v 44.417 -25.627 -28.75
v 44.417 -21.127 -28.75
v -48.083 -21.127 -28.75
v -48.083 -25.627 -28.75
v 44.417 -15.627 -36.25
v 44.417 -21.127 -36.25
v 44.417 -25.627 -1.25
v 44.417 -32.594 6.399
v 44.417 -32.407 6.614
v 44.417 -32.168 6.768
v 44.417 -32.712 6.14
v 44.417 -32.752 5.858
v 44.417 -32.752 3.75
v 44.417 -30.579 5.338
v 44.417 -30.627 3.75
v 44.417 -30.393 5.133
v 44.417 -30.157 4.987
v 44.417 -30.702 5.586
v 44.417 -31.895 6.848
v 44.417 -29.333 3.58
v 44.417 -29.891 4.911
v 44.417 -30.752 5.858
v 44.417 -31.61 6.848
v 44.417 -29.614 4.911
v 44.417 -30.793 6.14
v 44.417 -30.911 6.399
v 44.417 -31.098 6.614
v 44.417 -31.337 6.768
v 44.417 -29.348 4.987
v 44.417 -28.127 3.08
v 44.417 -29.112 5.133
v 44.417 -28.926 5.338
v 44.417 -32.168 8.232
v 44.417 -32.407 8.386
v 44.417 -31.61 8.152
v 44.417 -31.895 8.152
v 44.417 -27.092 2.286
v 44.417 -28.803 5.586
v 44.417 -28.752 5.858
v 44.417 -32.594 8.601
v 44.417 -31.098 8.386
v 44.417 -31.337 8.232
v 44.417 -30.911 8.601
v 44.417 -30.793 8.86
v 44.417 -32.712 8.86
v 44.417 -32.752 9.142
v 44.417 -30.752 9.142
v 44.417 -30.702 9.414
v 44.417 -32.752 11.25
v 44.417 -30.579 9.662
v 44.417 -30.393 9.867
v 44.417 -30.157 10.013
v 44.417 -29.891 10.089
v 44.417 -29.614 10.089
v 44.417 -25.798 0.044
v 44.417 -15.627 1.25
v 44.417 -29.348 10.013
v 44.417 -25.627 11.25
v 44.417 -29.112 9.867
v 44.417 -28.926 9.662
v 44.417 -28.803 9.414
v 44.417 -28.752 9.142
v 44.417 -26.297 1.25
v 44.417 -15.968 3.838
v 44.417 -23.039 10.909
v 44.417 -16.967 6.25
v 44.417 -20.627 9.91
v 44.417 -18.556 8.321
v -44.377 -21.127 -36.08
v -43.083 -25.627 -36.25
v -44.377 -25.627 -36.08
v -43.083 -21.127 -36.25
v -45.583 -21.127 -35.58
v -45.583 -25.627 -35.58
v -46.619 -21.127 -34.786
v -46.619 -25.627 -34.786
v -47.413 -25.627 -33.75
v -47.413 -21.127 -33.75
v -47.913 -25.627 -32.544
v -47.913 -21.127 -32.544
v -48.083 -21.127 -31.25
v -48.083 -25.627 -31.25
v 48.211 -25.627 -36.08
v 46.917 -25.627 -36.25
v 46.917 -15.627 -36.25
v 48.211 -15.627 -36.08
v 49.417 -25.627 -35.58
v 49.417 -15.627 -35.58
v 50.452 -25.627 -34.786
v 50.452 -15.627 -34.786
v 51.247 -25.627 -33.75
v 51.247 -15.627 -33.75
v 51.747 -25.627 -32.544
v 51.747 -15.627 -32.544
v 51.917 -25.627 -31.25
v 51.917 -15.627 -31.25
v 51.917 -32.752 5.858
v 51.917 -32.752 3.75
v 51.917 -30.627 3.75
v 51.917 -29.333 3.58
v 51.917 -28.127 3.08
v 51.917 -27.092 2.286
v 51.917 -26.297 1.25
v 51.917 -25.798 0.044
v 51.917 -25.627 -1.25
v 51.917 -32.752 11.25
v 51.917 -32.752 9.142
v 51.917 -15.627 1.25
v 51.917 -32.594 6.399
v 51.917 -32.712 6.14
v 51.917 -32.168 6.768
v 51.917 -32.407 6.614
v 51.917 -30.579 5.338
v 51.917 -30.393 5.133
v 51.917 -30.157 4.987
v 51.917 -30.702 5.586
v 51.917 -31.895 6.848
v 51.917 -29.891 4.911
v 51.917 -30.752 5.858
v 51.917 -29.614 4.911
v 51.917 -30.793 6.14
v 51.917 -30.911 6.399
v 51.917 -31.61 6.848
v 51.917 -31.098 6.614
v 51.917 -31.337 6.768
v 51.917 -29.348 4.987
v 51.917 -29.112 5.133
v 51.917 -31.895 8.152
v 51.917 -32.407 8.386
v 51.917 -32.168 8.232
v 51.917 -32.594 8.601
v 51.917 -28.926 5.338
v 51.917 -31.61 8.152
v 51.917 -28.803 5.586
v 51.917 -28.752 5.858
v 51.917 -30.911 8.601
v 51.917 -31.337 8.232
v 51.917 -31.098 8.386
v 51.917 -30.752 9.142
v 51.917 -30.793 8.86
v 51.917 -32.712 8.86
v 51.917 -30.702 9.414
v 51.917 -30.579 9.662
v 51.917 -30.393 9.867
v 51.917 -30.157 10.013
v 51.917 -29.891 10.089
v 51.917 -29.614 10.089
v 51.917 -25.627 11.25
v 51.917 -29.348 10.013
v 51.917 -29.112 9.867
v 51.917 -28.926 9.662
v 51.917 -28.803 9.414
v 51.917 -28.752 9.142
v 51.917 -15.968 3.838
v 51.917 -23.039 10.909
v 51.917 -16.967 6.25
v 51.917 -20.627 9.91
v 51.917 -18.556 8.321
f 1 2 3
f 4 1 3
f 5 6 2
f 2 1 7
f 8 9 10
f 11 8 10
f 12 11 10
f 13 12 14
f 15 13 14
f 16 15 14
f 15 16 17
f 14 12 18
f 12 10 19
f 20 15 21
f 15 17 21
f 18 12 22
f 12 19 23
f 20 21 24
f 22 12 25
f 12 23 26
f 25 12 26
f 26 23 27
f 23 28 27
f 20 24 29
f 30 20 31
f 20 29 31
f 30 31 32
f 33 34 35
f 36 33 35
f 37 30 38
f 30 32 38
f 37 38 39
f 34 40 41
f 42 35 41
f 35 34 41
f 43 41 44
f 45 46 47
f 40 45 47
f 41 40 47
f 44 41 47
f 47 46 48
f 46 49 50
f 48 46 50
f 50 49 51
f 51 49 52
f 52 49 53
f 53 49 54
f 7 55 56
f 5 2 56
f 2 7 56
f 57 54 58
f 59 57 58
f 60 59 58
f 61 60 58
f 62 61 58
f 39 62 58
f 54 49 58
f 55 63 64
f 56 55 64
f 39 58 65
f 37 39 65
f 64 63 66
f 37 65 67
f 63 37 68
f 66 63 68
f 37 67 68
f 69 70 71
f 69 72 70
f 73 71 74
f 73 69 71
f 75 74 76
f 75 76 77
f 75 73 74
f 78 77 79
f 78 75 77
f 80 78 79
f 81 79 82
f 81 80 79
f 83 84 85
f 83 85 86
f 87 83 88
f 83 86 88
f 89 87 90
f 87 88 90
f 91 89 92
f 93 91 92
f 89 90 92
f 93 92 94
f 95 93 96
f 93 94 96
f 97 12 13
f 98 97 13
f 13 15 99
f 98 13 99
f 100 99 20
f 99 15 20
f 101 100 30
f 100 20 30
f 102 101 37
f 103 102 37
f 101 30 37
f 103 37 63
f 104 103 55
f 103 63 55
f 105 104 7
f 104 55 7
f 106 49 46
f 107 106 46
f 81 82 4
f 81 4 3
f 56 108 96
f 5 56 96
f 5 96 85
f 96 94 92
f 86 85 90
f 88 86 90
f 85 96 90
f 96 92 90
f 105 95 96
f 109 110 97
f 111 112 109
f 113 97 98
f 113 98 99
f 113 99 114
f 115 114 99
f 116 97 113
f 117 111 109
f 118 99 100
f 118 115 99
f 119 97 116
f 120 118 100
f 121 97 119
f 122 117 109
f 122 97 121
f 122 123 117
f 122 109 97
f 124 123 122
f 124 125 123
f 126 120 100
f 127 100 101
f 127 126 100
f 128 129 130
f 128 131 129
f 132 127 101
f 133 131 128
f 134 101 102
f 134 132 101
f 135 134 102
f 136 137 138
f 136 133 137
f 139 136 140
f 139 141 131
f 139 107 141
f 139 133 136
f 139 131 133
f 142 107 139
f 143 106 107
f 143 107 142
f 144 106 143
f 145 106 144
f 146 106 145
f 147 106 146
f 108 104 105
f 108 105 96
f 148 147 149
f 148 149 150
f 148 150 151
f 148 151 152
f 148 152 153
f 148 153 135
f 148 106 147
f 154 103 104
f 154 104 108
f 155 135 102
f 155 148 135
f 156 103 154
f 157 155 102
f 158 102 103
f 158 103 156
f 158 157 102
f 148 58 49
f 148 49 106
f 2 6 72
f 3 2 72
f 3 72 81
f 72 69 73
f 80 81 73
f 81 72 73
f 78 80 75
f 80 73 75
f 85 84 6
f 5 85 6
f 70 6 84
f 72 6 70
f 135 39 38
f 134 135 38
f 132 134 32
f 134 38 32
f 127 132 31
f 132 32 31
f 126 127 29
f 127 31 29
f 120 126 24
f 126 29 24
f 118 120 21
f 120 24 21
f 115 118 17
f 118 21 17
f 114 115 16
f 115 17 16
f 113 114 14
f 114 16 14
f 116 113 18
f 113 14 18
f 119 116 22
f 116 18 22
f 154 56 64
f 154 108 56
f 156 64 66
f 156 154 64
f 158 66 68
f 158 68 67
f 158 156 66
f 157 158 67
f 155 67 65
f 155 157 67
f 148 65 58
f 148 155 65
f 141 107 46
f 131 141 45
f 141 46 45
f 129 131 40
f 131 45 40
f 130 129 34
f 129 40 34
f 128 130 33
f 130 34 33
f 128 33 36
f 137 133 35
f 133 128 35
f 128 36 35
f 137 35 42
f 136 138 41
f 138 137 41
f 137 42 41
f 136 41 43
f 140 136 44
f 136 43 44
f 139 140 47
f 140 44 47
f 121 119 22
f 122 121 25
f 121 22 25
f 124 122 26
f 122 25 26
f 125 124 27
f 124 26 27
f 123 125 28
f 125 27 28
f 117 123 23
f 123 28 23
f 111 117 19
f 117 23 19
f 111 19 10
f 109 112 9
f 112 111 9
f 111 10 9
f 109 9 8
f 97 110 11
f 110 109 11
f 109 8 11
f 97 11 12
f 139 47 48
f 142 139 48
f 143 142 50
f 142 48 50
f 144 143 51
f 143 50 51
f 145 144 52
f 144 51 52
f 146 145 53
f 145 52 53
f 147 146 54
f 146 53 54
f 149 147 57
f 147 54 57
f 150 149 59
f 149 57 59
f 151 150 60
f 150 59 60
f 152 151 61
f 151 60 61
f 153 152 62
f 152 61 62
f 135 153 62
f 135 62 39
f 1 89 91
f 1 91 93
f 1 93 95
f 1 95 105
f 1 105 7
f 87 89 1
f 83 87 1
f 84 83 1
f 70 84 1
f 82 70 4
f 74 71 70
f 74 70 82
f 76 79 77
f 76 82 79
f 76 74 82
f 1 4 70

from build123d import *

# Parameters (mm, degrees)
PUSHER_BASE_DEPTH   = 15
SKETCH3_R           = 1.95
SCREW_HOLE_DEPTH    = 7.5
SKETCH6_W           = 7.5
SKETCH6_H           = 30.25
PUSHER_HEAD_DEPTH   = 3.75
FILLET1_R           = 2
SKETCH9_W           = 40
SKETCH9_H           = 10
BOSS_EXTRUDE1_DEPTH = 7.5
SKETCH10_W          = 92.5
SKETCH10_H          = 4.5
BOSS_EXTRUDE2_DEPTH = 7.5
FILLET7_R           = 10
FILLET8_R           = 5
FILLET9_START       = 44.416899441
FILLET9_DEPTH       = 7.5
CUT_EXTRUDE1_DEPTH  = 10
SKETCH13_W          = 31.257668492
SKETCH13_H          = 16.460534108
CUT_EXTRUDE2_DEPTH  = 40


with BuildPart() as part:
    # Sketch1 → pusher base (new body)
    with BuildSketch(Plane.XY):
        Polygon((59.166899441, -45.877477752), (51.666899441, -45.877477752), (44.666899441, -45.877477752), (37.166899441, -45.877477752), (37.166899441, -69.377477752), (41.916899441, -69.377477752), (41.916899441, -64.127477752), (54.416899441, -64.127477752), (54.416899441, -69.377477752), (59.166899441, -69.377477752), align=None)
        with BuildLine():
            Line((48.279417247, -51.877477752), (48.054381634, -51.877477752))
            ThreePointArc((48.054381634, -51.877477752), (39.166899441, -50.877477752), (48.054381634, -49.877477752))
            Line((48.054381634, -49.877477752), (48.279417247, -49.877477752))
            ThreePointArc((48.279417247, -49.877477752), (57.166899441, -50.877477752), (48.279417247, -51.877477752))
        make_face(mode=Mode.SUBTRACT)
    extrude(amount=PUSHER_BASE_DEPTH)

    # Sketch3 → screw hole (cut)
    with BuildSketch(Plane.XZ.offset(64.127477752)):
        with Locations(Location((48.166899441, 7.5, 0), (0, 0, 270))):
            Circle(SKETCH3_R)
    extrude(amount=-SCREW_HOLE_DEPTH, mode=Mode.SUBTRACT)

    # Sketch6 → pusher head (add, symmetric)
    with BuildSketch(Plane.XY.offset(7.5)):
        with Locations((48.166899441, -30.752477752)):
            Rectangle(SKETCH6_W, SKETCH6_H)
    extrude(amount=PUSHER_HEAD_DEPTH, both=True)

    # Fillet1
    # the kernel refuses this fillet: 2 mm, written as the material it takes off along each edge
    with BuildSketch(Plane(origin=(64.166899441, -45.877477752, 0), x_dir=(0, -1, 0), z_dir=(-1, 0, 0)), Plane(origin=(32.166899441, -45.877477752, 15), x_dir=(0, -1, 0), z_dir=(1, 0, 0))) as fillet1_piece_1:
        with BuildLine():
            CenterArc((FILLET1_R, FILLET1_R), FILLET1_R, 180, 90)
            Line((0, FILLET1_R), (0, 0))
            Line((0, 0), (FILLET1_R, 0))
        make_face()
    extrude(amount=32, mode=Mode.SUBTRACT)

    # Sketch9 → Boss-Extrude1 (add)
    with BuildSketch(Plane(origin=(51.916899441, 0, 0), x_dir=(0, 0, -1), z_dir=(1, 0, 0))):
        with Locations((16.25, -20.627477752)):
            Rectangle(SKETCH9_W, SKETCH9_H)
    extrude(amount=-BOSS_EXTRUDE1_DEPTH)

    # Sketch10 → Boss-Extrude2 (add)
    with BuildSketch(Plane(origin=(0, 0, -36.25), x_dir=(-1, 0, 0), z_dir=(0, 0, -1))):
        with Locations((1.833100559, -23.377477752)):
            Rectangle(SKETCH10_W, SKETCH10_H)
    extrude(amount=-BOSS_EXTRUDE2_DEPTH)

    # Fillet7
    fillet7_edges = [part.edges().sort_by_distance(p)[0] for p in [
        (48.166899441, -15.627477752, 11.25),
    ]]
    fillet(fillet7_edges, radius=FILLET7_R)

    # Fillet8
    fillet8_edges = [part.edges().sort_by_distance(p)[0] for p in [
        (-48.083100559, -23.377477752, -36.25),
        (48.166899441, -25.627477752, 3.75),
        (51.916899441, -20.627477752, -36.25),
    ]]
    fillet(fillet8_edges, radius=FILLET8_R)

    # Fillet9: read off the stored shape, not the designer's step
    # Fillet9 outline → Fillet9 (add)
    with BuildSketch(Plane.YZ.offset(FILLET9_START)):
        with BuildLine():
            ThreePointArc((-45.877477752, 2), (-45.935475959, 1.521848316), (-46.106106786, 1.071428571))
            ThreePointArc((-46.106106786, 1.071428571), (-44.265425216, 3.02826734), (-41.677679368, 3.75))
            Line((-41.677679368, 3.75), (-45.877477752, 3.75))
            Line((-45.877477752, 3.75), (-45.877477752, 2))
        make_face()
        with BuildLine():
            Line((-45.877477752, 13), (-45.877477752, 11.25))
            Line((-45.877477752, 11.25), (-41.677679368, 11.25))
            ThreePointArc((-41.677679368, 11.25), (-44.265425216, 11.97173266), (-46.106106785, 13.928571429))
            ThreePointArc((-46.106106785, 13.928571429), (-45.935475959, 13.478151684), (-45.877477752, 13))
        make_face()
    extrude(amount=FILLET9_DEPTH)

    # Sketch12 → Cut-Extrude1 (cut)
    with BuildSketch(Plane.ZY.offset(-44.416899441)):
        with BuildLine():
            ThreePointArc((5.858454214, -30.752477752), (6.858454214, -31.752477752), (5.858454214, -32.752477752))
            Line((5.858454214, -32.752477752), (3.75, -32.752477752))
            Line((3.75, -32.752477752), (3.75, -45.877477752))
            Line((3.75, -45.877477752), (11.25, -45.877477752))
            Line((11.25, -45.877477752), (11.25, -32.752477752))
            Line((11.25, -32.752477752), (9.141545786, -32.752477752))
            ThreePointArc((9.141545786, -32.752477752), (8.141545786, -31.752477752), (9.141545786, -30.752477752))
            ThreePointArc((9.141545786, -30.752477752), (10.09823306, -29.752477752), (9.141545786, -28.752477752))
            Line((9.141545786, -28.752477752), (5.858454214, -28.752477752))
            ThreePointArc((5.858454214, -28.752477752), (4.90176694, -29.752477752), (5.858454214, -30.752477752))
        make_face()
    extrude(amount=-CUT_EXTRUDE1_DEPTH, mode=Mode.SUBTRACT)


with BuildPart() as cut_extrude1_piece_1:
    # of the separate pieces the step leaves, piece 1, a body of its own (cut_extrude1_pieces)
    add(part.part.solids().sort_by_distance((44.416899441, -30.627477752, 3.75))[0])


with BuildPart() as cut_extrude1_piece_2:
    # of the separate pieces the step leaves, piece 2, a body of its own (cut_extrude1_pieces)
    add(part.part.solids().sort_by_distance((44.416899441, -45.877477752, 11.25))[0])

    # Sketch13 → Cut-Extrude2 (cut)
    with BuildSketch(Plane.XZ.offset(32.752477752)):
        with Locations((47.849248082, 8.230267054)):
            Rectangle(SKETCH13_W, SKETCH13_H)
    extrude(amount=CUT_EXTRUDE2_DEPTH, mode=Mode.SUBTRACT)


solid = cut_extrude1_piece_1.part
